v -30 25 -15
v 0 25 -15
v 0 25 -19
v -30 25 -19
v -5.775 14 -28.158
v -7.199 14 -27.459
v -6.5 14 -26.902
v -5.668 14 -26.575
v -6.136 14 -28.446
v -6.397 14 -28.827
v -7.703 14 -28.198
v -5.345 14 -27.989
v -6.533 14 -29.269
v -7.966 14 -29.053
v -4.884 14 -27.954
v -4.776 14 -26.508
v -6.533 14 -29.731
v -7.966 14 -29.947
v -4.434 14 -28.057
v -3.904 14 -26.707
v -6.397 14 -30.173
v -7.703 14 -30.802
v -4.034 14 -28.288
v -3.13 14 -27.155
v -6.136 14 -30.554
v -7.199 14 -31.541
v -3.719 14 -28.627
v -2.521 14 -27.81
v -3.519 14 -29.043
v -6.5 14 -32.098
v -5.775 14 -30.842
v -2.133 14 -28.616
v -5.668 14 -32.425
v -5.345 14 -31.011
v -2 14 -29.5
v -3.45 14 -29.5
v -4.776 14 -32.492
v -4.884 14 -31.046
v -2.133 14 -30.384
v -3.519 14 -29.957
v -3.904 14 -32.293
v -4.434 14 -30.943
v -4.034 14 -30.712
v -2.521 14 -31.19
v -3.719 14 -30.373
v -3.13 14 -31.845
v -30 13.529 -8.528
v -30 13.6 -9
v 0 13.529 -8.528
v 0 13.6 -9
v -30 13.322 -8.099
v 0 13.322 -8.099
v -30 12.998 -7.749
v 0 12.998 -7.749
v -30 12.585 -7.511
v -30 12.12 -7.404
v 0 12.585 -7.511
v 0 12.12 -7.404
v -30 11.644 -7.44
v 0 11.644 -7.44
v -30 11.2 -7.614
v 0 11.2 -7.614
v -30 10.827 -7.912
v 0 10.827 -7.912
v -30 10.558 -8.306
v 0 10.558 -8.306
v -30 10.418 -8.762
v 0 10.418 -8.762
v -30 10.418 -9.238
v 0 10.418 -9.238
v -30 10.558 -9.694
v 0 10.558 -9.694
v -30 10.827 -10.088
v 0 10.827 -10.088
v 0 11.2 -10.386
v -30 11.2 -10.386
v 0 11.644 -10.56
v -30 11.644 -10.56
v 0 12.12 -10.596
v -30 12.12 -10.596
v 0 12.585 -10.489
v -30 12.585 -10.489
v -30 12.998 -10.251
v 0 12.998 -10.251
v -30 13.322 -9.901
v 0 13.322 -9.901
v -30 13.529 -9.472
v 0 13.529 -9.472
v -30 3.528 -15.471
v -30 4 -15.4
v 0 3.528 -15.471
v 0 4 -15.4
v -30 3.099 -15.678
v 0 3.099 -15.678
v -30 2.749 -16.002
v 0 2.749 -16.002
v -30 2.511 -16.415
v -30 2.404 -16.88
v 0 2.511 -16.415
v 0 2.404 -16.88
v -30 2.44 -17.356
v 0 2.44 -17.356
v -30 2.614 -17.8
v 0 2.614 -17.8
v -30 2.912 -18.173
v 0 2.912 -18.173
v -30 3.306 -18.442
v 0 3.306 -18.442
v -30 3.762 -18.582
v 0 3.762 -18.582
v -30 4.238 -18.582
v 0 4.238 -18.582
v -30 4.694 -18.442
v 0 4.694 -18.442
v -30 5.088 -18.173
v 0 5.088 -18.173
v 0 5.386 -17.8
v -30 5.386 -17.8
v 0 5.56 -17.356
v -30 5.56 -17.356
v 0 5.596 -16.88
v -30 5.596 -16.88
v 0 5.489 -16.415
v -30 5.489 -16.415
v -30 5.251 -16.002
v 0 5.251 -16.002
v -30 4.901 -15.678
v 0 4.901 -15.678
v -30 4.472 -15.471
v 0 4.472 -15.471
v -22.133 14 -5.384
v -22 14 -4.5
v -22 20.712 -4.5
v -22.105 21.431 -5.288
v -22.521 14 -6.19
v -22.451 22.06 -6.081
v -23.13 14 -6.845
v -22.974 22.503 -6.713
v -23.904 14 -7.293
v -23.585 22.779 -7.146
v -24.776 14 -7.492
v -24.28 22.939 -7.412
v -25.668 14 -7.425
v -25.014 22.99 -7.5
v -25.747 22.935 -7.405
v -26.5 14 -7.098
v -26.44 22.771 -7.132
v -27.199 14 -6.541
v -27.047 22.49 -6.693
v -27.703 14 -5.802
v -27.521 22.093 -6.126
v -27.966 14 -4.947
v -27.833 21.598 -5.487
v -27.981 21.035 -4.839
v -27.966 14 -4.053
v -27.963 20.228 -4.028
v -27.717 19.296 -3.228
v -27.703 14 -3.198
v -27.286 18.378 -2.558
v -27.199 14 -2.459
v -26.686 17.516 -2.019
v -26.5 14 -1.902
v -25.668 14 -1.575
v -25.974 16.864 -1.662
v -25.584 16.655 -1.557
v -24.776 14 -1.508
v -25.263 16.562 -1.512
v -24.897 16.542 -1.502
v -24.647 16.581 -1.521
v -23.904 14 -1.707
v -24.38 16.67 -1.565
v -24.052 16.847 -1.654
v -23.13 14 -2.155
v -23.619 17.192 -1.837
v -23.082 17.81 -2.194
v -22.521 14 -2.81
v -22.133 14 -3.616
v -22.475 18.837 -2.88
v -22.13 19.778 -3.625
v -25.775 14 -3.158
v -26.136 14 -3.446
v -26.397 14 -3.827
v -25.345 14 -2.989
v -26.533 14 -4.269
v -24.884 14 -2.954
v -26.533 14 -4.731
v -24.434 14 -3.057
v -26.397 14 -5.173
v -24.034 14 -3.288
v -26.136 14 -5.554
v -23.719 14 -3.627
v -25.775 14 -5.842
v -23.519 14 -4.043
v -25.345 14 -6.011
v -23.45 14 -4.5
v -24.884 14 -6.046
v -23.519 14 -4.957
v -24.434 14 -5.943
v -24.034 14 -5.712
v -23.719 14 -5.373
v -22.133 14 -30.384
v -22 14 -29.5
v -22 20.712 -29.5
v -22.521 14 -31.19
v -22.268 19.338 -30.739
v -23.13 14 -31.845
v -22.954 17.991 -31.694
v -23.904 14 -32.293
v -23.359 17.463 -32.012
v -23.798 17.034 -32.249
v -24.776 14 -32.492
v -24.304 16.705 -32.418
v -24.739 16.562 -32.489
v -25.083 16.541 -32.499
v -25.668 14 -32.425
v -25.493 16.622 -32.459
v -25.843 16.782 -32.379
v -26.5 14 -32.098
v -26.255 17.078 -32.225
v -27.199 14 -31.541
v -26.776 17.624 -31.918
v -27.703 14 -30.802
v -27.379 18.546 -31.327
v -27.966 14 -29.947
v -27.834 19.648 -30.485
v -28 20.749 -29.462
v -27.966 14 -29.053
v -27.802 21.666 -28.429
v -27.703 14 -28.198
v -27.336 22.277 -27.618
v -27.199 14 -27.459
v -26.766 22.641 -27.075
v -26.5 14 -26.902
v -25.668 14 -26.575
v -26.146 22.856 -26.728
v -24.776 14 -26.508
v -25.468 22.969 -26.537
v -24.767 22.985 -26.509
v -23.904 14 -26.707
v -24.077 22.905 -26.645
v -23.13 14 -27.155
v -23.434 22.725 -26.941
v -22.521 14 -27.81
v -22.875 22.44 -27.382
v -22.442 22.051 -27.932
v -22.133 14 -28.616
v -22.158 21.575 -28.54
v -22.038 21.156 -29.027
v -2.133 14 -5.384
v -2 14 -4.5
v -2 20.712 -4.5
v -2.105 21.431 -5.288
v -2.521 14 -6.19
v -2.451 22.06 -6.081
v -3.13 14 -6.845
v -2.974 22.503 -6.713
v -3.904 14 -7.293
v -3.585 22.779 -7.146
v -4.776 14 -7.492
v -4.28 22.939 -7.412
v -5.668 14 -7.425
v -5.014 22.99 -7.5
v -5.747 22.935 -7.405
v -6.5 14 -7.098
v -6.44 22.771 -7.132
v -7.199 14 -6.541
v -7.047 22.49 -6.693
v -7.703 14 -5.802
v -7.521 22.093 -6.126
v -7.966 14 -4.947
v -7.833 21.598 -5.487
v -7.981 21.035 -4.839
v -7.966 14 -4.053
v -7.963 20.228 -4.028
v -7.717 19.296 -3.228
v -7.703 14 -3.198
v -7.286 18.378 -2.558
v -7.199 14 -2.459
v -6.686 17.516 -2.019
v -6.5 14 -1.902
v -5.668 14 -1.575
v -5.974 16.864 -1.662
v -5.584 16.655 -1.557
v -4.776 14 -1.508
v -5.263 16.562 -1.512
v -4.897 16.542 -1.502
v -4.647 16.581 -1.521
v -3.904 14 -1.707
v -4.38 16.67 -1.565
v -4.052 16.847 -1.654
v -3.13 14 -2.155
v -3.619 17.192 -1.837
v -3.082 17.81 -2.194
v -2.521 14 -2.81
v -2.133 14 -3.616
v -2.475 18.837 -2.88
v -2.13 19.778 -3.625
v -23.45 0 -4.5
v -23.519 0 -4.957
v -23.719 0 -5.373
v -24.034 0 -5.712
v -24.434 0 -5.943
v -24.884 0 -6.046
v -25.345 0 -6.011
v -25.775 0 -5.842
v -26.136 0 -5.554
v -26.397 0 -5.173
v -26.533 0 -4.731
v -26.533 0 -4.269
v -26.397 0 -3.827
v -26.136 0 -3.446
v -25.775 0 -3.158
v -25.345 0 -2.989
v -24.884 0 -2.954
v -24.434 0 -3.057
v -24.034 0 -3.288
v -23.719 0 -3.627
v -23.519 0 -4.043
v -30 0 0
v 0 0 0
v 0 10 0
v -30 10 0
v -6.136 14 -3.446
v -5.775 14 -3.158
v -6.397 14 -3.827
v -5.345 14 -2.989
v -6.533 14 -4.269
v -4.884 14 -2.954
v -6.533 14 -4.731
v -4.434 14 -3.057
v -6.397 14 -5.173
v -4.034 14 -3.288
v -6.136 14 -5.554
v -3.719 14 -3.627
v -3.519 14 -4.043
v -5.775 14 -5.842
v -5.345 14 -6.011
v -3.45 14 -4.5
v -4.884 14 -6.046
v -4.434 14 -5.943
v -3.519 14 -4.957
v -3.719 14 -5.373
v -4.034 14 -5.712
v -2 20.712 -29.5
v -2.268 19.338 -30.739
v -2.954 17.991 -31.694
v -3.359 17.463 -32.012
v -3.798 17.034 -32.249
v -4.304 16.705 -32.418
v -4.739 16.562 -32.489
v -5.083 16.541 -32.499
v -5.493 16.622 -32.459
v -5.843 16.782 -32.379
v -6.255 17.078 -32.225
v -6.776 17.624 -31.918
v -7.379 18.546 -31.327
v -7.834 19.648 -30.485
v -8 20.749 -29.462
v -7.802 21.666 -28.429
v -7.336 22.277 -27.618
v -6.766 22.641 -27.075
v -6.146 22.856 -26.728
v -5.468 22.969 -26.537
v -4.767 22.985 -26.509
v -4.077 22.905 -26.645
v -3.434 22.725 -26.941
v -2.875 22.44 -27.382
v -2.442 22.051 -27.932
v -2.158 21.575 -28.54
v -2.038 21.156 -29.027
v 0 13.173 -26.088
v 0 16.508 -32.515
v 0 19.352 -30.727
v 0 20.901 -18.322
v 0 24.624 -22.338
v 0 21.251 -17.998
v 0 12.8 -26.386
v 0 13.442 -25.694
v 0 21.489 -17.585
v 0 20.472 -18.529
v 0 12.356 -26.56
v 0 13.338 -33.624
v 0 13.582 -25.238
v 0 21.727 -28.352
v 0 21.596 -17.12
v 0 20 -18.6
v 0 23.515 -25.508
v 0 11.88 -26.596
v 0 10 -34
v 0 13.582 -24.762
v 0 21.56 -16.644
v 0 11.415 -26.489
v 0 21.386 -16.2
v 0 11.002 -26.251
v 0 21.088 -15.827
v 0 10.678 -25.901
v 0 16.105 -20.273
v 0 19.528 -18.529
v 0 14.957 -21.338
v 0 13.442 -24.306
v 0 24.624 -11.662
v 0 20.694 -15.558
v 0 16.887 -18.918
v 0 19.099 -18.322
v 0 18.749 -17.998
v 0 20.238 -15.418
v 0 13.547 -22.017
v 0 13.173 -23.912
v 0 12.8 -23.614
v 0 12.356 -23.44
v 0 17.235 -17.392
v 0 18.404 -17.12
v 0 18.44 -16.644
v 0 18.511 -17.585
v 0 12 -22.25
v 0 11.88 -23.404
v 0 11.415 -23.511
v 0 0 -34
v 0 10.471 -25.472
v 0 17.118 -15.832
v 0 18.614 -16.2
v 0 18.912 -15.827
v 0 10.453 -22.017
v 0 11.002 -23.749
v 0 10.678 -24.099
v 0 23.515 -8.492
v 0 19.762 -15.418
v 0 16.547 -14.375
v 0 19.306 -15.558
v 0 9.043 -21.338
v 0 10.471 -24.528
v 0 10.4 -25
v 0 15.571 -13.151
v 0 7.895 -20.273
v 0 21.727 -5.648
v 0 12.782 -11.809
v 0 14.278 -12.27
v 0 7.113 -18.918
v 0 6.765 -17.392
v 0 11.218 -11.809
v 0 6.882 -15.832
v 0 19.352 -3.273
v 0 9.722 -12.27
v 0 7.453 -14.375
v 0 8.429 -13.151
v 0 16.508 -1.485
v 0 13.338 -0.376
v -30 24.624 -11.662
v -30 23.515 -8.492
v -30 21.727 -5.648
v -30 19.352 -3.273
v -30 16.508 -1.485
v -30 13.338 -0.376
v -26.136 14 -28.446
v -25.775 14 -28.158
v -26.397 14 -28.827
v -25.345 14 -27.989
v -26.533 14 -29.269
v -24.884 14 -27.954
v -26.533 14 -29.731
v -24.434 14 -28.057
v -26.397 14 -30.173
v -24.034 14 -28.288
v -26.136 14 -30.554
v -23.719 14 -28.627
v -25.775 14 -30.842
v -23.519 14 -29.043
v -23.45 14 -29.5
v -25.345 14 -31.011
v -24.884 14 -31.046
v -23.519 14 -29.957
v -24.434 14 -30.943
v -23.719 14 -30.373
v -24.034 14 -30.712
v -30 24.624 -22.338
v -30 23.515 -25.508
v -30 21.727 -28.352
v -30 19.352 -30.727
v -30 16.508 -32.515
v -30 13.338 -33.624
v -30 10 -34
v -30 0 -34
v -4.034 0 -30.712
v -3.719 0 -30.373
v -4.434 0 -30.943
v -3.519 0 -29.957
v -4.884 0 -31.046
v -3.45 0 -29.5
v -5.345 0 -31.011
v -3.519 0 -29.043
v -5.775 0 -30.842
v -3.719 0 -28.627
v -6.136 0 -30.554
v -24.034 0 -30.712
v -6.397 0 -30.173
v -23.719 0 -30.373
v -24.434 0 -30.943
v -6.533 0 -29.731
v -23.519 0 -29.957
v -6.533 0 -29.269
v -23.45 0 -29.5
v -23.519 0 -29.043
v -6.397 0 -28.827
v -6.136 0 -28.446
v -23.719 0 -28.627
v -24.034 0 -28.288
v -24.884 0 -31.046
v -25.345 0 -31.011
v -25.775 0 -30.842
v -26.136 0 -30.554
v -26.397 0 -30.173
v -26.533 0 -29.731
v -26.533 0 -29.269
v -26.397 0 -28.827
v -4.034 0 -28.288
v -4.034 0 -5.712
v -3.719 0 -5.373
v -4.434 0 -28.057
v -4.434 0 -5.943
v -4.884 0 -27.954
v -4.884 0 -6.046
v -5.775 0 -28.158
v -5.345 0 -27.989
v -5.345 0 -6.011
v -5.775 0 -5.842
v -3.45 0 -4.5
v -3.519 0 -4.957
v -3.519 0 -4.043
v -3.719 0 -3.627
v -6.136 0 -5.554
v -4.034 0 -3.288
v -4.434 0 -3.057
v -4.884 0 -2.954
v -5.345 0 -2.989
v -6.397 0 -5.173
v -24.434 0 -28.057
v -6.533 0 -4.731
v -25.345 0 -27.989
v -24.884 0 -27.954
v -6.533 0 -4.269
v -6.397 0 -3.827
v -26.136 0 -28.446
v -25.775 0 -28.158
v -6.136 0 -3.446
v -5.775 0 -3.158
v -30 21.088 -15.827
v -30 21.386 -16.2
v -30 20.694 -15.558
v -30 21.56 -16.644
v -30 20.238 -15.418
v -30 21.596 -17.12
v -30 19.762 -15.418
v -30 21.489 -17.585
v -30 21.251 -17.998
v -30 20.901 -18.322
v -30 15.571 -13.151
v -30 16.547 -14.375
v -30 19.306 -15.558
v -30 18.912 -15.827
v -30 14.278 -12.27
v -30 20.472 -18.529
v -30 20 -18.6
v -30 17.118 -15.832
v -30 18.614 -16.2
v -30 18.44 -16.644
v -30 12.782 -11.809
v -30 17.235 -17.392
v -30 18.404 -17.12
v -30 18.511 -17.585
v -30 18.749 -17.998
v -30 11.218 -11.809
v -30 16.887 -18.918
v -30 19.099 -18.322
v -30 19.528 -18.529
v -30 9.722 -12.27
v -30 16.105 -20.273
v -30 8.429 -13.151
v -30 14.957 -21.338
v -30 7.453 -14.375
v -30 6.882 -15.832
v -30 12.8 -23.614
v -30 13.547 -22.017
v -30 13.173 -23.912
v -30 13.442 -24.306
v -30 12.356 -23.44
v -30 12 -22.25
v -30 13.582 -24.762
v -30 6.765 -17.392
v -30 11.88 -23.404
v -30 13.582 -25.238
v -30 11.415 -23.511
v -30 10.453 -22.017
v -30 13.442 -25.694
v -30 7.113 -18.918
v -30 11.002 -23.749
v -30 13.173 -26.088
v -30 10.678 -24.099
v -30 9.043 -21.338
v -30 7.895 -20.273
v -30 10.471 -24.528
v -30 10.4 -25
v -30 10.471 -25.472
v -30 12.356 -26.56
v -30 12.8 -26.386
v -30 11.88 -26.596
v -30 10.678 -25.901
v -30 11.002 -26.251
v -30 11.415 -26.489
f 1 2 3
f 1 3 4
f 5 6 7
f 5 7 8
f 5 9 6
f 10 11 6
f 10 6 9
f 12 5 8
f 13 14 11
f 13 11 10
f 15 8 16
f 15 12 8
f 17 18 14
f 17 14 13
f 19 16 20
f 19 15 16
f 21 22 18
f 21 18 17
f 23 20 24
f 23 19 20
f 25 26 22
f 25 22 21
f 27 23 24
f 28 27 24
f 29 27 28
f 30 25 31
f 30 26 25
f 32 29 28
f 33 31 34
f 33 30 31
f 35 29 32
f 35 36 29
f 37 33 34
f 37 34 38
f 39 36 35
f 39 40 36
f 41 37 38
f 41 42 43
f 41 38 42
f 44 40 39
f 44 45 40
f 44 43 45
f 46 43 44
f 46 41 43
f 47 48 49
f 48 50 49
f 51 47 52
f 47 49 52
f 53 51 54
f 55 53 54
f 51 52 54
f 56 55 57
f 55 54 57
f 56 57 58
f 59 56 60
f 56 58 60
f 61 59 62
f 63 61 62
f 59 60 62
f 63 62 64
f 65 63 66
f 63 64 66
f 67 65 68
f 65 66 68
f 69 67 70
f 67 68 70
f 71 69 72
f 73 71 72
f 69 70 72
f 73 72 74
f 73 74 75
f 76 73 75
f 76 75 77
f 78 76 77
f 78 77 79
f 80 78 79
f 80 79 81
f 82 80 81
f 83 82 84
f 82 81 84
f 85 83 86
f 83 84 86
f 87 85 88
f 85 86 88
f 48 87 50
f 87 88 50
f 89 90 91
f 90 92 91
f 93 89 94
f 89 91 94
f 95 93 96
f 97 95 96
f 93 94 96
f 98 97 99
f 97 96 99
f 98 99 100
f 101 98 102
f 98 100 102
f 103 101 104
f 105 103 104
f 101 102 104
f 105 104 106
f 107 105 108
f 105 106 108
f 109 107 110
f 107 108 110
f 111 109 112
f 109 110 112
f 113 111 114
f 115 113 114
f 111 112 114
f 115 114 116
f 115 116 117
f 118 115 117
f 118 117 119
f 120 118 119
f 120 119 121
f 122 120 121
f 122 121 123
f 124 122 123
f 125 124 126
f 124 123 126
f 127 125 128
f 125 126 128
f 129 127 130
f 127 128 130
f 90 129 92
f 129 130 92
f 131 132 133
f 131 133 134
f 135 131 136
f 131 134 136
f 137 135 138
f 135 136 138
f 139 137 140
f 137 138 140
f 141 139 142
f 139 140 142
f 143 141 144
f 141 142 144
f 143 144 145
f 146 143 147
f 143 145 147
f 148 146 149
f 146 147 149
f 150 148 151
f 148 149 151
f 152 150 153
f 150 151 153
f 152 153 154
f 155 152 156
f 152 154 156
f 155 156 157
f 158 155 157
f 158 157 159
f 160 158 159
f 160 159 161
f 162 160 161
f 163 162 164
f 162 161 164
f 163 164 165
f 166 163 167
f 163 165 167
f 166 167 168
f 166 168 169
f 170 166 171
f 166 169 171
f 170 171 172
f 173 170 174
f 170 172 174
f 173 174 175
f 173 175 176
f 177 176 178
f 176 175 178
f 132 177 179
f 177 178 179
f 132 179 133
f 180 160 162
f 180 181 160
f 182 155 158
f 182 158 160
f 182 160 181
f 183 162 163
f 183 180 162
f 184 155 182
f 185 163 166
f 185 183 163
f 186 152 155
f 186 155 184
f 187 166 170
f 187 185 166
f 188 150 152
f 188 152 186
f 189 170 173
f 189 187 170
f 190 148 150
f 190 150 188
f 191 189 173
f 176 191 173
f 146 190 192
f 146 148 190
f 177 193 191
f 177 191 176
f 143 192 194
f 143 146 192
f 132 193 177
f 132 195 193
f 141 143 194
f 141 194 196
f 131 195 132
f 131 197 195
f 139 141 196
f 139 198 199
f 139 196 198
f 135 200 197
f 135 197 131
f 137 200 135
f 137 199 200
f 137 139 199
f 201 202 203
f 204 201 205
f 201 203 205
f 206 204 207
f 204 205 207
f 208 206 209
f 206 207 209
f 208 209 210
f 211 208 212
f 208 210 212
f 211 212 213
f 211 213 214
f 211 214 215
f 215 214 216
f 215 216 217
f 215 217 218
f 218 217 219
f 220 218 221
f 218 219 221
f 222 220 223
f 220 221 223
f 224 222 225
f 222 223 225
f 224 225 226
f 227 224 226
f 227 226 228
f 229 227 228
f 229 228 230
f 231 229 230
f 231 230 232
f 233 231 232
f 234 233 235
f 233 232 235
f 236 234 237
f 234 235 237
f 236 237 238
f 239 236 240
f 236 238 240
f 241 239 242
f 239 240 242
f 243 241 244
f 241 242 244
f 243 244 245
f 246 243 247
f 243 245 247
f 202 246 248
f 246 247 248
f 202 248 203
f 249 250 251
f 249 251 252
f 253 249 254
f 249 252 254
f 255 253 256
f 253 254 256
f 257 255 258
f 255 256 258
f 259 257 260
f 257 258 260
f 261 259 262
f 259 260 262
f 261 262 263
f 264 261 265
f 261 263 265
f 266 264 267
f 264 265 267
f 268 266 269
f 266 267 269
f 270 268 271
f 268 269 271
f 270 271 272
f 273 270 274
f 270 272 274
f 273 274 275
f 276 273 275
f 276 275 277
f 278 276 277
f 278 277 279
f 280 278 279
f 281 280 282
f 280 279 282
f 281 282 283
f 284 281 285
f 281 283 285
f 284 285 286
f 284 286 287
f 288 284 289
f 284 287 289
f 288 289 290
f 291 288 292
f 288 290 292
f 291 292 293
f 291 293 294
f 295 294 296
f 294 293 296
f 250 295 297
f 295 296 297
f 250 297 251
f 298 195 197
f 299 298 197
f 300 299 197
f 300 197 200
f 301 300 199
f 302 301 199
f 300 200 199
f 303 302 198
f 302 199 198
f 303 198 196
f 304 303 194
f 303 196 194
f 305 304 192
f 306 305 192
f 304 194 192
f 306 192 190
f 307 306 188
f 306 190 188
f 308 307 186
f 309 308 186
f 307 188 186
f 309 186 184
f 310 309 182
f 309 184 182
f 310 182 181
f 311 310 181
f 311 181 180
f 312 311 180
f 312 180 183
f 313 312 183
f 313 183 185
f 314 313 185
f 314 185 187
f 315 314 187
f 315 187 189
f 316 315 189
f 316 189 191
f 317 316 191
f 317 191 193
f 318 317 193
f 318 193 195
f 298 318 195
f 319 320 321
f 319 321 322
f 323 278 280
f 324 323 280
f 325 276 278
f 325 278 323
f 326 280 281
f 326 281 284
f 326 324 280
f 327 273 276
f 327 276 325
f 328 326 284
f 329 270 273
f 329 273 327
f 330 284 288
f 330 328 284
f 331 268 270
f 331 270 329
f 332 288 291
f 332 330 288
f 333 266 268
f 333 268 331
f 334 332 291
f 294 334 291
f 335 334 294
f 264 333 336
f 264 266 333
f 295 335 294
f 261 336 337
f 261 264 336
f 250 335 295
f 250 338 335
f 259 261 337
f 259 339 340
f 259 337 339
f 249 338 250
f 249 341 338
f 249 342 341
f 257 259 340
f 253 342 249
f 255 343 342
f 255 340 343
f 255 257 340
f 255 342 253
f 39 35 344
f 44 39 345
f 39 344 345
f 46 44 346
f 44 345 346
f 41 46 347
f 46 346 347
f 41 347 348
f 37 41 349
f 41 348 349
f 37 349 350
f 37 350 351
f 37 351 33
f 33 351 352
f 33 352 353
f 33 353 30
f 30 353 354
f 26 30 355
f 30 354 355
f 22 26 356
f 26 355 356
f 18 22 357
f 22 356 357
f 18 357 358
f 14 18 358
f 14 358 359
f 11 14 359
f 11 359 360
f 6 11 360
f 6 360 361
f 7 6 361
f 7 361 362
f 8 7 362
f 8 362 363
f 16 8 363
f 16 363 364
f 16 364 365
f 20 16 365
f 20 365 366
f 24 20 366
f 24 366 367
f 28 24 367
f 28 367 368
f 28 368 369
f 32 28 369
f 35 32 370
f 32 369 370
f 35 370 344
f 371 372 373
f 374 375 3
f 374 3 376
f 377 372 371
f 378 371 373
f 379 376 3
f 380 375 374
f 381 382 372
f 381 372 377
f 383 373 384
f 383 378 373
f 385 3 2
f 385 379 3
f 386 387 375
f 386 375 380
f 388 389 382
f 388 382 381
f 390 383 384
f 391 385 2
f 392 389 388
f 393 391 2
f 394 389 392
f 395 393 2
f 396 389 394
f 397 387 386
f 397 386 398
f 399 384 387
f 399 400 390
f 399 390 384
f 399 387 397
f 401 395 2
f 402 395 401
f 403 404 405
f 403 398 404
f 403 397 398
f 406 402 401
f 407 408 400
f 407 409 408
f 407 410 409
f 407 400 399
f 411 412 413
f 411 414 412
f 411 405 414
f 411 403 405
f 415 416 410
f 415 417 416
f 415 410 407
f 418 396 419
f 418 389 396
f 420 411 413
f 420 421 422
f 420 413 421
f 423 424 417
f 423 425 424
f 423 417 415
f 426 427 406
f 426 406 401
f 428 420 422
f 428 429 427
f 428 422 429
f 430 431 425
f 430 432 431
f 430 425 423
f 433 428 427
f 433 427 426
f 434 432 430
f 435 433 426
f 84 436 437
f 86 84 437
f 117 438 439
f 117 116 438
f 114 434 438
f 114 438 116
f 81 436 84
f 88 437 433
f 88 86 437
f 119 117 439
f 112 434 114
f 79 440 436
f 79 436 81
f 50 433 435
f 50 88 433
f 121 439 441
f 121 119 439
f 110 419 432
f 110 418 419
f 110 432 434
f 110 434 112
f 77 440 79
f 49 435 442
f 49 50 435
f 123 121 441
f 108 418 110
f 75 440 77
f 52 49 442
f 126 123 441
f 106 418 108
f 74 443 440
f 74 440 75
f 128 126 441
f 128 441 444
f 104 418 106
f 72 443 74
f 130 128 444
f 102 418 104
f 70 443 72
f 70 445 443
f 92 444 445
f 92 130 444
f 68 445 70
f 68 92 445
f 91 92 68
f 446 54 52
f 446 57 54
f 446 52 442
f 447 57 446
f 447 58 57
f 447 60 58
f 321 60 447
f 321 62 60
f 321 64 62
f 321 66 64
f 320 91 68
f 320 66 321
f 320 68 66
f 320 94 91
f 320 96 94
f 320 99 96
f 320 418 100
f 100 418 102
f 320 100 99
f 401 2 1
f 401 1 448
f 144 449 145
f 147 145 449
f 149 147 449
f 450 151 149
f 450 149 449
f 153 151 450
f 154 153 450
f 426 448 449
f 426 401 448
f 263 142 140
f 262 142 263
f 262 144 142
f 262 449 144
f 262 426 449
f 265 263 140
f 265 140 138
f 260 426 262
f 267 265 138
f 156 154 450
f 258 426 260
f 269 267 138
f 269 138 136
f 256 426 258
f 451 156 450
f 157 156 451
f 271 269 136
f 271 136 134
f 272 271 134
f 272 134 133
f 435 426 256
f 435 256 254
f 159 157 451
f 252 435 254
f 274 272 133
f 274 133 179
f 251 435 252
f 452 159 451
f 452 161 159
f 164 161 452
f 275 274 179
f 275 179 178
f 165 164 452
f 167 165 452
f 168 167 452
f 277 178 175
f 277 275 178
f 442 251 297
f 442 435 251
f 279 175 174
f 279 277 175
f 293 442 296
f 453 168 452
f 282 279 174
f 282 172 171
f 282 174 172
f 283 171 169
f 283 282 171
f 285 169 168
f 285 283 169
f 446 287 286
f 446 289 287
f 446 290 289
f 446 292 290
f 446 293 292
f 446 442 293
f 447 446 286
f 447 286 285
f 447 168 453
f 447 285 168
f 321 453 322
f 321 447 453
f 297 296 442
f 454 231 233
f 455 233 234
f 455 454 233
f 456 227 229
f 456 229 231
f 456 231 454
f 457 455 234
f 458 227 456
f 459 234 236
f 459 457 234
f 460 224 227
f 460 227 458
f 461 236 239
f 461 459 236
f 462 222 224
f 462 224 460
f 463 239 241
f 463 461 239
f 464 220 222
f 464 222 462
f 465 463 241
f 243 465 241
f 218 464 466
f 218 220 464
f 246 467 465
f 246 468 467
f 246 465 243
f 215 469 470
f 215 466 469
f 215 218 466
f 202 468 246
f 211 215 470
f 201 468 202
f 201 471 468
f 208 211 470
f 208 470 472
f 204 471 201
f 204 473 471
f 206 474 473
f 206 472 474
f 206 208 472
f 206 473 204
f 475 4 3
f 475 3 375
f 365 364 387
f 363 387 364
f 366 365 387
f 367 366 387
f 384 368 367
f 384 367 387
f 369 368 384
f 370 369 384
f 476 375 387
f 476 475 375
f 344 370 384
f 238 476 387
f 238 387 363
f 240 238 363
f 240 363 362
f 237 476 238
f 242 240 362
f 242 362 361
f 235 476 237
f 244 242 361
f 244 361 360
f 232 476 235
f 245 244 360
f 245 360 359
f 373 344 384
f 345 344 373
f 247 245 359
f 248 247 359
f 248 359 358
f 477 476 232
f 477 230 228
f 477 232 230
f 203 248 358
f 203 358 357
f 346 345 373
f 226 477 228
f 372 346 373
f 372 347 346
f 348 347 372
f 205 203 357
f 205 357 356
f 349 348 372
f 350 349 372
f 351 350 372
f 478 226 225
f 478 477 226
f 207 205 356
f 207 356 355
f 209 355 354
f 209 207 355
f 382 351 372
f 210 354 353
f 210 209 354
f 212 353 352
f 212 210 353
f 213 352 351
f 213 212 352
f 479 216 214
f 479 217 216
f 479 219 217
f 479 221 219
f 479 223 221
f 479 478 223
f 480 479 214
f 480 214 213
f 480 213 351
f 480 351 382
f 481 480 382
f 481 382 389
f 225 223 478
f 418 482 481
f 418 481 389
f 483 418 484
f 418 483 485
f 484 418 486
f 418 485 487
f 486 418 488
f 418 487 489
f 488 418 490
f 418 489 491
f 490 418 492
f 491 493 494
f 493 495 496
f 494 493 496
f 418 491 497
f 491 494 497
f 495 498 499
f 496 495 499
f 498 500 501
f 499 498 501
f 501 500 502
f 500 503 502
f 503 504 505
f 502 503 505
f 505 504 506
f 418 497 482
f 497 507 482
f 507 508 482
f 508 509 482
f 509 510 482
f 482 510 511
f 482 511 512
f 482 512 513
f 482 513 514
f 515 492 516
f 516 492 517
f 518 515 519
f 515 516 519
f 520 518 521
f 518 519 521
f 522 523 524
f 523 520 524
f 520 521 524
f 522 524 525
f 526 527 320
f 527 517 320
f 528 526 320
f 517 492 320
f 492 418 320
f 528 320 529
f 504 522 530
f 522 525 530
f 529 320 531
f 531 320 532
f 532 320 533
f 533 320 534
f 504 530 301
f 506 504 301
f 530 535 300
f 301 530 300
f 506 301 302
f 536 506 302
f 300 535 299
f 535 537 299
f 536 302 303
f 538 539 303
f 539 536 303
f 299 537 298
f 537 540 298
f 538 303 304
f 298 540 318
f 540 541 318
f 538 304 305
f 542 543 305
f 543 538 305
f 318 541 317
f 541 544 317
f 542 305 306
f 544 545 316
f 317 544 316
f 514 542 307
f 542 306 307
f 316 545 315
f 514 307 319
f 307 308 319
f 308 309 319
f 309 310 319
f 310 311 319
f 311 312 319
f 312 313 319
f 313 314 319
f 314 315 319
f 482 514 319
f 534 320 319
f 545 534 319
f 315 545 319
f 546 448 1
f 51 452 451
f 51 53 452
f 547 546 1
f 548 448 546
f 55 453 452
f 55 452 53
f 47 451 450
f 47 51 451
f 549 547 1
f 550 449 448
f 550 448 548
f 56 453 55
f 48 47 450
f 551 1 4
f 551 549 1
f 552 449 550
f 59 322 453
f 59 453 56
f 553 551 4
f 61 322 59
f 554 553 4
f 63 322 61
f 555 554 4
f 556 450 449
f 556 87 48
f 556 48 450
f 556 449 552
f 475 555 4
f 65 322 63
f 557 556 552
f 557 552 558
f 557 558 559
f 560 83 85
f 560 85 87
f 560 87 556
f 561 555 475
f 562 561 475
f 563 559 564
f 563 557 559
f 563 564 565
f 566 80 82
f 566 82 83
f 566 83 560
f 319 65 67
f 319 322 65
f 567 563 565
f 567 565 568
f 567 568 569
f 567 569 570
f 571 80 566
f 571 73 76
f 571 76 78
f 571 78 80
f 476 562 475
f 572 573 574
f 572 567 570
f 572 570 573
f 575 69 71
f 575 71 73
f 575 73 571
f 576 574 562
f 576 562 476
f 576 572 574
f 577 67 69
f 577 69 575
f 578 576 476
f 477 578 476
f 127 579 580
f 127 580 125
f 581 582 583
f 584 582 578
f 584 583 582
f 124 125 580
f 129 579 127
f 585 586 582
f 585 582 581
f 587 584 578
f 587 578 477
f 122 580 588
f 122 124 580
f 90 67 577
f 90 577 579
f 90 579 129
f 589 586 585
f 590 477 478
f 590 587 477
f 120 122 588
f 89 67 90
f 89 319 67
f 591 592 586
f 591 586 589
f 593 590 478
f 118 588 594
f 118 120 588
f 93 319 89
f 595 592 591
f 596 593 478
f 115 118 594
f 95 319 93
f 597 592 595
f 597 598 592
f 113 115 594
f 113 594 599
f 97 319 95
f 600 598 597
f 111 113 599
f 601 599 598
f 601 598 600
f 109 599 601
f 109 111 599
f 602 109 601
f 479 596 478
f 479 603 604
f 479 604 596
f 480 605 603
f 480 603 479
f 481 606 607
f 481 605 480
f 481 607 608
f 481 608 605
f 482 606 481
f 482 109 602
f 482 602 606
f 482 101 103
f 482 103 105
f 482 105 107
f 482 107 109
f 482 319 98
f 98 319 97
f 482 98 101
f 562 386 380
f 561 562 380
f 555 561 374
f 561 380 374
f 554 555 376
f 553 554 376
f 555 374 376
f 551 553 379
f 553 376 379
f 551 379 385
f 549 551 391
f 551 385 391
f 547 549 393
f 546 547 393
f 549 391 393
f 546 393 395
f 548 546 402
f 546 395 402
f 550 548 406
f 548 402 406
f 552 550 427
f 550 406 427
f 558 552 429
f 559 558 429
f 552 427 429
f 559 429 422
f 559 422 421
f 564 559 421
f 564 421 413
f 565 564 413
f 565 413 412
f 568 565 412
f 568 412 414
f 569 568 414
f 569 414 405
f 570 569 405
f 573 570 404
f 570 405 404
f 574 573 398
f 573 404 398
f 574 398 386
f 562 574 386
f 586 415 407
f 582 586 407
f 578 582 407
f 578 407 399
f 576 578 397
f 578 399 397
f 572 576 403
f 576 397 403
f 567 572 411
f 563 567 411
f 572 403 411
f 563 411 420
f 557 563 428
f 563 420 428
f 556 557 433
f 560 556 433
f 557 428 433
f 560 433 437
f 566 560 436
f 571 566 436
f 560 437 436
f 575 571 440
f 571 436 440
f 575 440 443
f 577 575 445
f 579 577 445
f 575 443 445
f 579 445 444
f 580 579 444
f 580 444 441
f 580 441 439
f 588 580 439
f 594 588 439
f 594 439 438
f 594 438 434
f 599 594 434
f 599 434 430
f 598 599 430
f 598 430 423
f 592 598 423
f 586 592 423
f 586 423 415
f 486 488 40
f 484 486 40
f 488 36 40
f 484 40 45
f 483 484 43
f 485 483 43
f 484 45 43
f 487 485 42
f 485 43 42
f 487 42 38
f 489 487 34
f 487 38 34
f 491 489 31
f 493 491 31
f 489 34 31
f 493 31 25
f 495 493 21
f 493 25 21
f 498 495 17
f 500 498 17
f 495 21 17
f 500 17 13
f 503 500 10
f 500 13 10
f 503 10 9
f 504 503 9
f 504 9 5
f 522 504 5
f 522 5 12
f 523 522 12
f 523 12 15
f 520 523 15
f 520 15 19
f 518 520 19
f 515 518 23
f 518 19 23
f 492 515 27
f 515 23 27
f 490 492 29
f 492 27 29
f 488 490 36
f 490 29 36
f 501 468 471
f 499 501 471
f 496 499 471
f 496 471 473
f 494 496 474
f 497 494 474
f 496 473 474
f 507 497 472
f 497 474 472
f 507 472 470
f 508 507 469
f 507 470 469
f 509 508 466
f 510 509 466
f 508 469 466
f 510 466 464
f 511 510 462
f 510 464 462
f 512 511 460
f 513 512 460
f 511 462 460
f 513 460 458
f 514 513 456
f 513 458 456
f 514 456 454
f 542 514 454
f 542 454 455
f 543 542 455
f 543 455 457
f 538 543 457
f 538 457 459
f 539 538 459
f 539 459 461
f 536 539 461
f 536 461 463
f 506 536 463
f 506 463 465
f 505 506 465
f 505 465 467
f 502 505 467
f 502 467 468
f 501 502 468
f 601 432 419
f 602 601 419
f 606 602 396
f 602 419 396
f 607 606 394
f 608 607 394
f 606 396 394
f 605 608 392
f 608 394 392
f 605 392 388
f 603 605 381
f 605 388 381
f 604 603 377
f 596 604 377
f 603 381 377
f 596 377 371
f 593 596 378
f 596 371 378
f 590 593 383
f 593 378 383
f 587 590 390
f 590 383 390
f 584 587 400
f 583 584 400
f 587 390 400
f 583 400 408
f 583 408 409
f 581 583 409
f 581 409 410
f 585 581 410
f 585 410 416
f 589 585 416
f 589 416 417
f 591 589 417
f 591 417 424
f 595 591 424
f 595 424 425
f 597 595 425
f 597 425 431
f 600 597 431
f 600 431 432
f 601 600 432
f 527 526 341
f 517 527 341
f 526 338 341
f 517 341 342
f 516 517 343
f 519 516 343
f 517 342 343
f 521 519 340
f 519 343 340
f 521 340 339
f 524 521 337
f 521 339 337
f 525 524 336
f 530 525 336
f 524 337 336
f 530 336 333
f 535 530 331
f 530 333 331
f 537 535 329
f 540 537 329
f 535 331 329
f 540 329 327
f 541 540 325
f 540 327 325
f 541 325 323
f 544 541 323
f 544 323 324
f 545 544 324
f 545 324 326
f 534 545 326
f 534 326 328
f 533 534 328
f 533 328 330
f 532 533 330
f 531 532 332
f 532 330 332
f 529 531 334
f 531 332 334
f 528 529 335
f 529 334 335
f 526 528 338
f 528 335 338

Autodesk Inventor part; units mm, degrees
ref_plane "YZ Plane" through (0, 0, 0) normal (1, 0, 0) x (0, 1, 0)
ref_plane "XZ Plane" through (0, 0, 0) normal (0, 1, 0) x (-1, 0, 0)
ref_plane "XY Plane" through (0, 0, 0) normal (0, 0, 1) x (1, 0, 0)
sketch "Sketch1" plane through (0, 0, 0) normal (0, 1, 0) x (-1, 0, 0)
  line L0 (0, 0) -> (30, 0)
  line L1 (30, 0) -> (30, -34)
  line L2 (30, -34) -> (0, -34)
  line L3 (0, -34) -> (0, 0)
  dimension "d0" = 30
  dimension "d1" = 34
extrude "Extrusion1" add sketch "Sketch1" along normal blind 25
sketch "Sketch2" plane through (0, 0, 0) normal (1, 0, 0) x (0, 0, -1)
  line L0 (34, 0) -> (0, 0) projected
  line L1 (17, 0) -> (17, 25) construction
  line L2 (34, 25) -> (0, 25) projected
  circle A0 centre (17, 12) radius 5.25
  circle A1 centre (17, 12) radius 10.2956 construction
  dimension "d4" = 10.5
  dimension "d5" = 12
extrude "Extrusion2" cut sketch "Sketch2" against normal blind 30
sketch "Sketch3" plane through (0, 0, 0) normal (1, 0, 0) x (0, 0, -1)
  circle A0 centre (17, 12) radius 5.25 projected
  circle A1 centre (17, 12) radius 8 construction
  circle A2 centre (17, 20) radius 1.6
  point P0 (0, 0)
  dimension "d8" = 16
  dimension "d9" = 3.2
extrude "Extrusion3" cut sketch "Sketch3" against normal blind 30 contours A2
pattern_circular "Circular Pattern1" count 4 over 360 about axis through (0, 12, -17) along (-1, 0, 0) of "Extrusion3"
sketch "Sketch4" plane through (0, 25, 0) normal (0, 1, 0) x (1, 0, 0)
  line L0 (0, 0) -> (0, 34) projected
  line L1 (0, 17) -> (-30, 17) construction
  line L2 (-30, 34) -> (-30, 0) projected
  line L3 (-5, 4.5) -> (-25, 4.5) construction
  line L4 (-25, 4.5) -> (-25, 29.5) construction
  line L5 (-25, 29.5) -> (-5, 29.5) construction
  line L6 (-5, 29.5) -> (-5, 4.5) construction
  line L7 (-5, 4.5) -> (-25, 29.5) construction
  line L8 (-25, 4.5) -> (-5, 29.5) construction
  circle A0 centre (-25, 4.5) radius 1.55
  circle A1 centre (-25, 29.5) radius 1.55
  circle A2 centre (-5, 29.5) radius 1.55
  circle A3 centre (-5, 4.5) radius 1.55
  point P0 (-15, 17)
  dimension "d15" = 20
  dimension "d16" = 25
  dimension "d17" = 3.1
  dimension "d18" = 3.1
  dimension "d19" = 3.1
  dimension "d20" = 3.1
extrude "Extrusion4" cut sketch "Sketch4" against normal blind 30
fillet "Fillet2" radius 15 2 edges at (-15, 25, -34) (-15, 25, 0)
sketch "Sketch7" plane through (0, 25, 0) normal (0, 1, 0) x (1, 0, 0)
  circle A0 centre (-25, 4.5) radius 1.55 projected
  circle A1 centre (-25, 4.5) radius 3
  circle A2 centre (-25, 29.5) radius 1.55 projected
  circle A3 centre (-25, 29.5) radius 3
  circle A4 centre (-5, 29.5) radius 1.55 projected
  circle A5 centre (-5, 29.5) radius 3
  circle A6 centre (-5, 4.5) radius 1.55 projected
  circle A7 centre (-5, 4.5) radius 3
  point P0 (0, 0)
  dimension "d46" = 6
  dimension "d47" = 6
  dimension "d48" = 6
  dimension "d49" = 6
extrude "Extrusion7" cut sketch "Sketch7" against normal blind 11 contours A0 | A1 | A2 | A3 | A4 | A5 | A6 | A7
properties part number "Nut holder"
